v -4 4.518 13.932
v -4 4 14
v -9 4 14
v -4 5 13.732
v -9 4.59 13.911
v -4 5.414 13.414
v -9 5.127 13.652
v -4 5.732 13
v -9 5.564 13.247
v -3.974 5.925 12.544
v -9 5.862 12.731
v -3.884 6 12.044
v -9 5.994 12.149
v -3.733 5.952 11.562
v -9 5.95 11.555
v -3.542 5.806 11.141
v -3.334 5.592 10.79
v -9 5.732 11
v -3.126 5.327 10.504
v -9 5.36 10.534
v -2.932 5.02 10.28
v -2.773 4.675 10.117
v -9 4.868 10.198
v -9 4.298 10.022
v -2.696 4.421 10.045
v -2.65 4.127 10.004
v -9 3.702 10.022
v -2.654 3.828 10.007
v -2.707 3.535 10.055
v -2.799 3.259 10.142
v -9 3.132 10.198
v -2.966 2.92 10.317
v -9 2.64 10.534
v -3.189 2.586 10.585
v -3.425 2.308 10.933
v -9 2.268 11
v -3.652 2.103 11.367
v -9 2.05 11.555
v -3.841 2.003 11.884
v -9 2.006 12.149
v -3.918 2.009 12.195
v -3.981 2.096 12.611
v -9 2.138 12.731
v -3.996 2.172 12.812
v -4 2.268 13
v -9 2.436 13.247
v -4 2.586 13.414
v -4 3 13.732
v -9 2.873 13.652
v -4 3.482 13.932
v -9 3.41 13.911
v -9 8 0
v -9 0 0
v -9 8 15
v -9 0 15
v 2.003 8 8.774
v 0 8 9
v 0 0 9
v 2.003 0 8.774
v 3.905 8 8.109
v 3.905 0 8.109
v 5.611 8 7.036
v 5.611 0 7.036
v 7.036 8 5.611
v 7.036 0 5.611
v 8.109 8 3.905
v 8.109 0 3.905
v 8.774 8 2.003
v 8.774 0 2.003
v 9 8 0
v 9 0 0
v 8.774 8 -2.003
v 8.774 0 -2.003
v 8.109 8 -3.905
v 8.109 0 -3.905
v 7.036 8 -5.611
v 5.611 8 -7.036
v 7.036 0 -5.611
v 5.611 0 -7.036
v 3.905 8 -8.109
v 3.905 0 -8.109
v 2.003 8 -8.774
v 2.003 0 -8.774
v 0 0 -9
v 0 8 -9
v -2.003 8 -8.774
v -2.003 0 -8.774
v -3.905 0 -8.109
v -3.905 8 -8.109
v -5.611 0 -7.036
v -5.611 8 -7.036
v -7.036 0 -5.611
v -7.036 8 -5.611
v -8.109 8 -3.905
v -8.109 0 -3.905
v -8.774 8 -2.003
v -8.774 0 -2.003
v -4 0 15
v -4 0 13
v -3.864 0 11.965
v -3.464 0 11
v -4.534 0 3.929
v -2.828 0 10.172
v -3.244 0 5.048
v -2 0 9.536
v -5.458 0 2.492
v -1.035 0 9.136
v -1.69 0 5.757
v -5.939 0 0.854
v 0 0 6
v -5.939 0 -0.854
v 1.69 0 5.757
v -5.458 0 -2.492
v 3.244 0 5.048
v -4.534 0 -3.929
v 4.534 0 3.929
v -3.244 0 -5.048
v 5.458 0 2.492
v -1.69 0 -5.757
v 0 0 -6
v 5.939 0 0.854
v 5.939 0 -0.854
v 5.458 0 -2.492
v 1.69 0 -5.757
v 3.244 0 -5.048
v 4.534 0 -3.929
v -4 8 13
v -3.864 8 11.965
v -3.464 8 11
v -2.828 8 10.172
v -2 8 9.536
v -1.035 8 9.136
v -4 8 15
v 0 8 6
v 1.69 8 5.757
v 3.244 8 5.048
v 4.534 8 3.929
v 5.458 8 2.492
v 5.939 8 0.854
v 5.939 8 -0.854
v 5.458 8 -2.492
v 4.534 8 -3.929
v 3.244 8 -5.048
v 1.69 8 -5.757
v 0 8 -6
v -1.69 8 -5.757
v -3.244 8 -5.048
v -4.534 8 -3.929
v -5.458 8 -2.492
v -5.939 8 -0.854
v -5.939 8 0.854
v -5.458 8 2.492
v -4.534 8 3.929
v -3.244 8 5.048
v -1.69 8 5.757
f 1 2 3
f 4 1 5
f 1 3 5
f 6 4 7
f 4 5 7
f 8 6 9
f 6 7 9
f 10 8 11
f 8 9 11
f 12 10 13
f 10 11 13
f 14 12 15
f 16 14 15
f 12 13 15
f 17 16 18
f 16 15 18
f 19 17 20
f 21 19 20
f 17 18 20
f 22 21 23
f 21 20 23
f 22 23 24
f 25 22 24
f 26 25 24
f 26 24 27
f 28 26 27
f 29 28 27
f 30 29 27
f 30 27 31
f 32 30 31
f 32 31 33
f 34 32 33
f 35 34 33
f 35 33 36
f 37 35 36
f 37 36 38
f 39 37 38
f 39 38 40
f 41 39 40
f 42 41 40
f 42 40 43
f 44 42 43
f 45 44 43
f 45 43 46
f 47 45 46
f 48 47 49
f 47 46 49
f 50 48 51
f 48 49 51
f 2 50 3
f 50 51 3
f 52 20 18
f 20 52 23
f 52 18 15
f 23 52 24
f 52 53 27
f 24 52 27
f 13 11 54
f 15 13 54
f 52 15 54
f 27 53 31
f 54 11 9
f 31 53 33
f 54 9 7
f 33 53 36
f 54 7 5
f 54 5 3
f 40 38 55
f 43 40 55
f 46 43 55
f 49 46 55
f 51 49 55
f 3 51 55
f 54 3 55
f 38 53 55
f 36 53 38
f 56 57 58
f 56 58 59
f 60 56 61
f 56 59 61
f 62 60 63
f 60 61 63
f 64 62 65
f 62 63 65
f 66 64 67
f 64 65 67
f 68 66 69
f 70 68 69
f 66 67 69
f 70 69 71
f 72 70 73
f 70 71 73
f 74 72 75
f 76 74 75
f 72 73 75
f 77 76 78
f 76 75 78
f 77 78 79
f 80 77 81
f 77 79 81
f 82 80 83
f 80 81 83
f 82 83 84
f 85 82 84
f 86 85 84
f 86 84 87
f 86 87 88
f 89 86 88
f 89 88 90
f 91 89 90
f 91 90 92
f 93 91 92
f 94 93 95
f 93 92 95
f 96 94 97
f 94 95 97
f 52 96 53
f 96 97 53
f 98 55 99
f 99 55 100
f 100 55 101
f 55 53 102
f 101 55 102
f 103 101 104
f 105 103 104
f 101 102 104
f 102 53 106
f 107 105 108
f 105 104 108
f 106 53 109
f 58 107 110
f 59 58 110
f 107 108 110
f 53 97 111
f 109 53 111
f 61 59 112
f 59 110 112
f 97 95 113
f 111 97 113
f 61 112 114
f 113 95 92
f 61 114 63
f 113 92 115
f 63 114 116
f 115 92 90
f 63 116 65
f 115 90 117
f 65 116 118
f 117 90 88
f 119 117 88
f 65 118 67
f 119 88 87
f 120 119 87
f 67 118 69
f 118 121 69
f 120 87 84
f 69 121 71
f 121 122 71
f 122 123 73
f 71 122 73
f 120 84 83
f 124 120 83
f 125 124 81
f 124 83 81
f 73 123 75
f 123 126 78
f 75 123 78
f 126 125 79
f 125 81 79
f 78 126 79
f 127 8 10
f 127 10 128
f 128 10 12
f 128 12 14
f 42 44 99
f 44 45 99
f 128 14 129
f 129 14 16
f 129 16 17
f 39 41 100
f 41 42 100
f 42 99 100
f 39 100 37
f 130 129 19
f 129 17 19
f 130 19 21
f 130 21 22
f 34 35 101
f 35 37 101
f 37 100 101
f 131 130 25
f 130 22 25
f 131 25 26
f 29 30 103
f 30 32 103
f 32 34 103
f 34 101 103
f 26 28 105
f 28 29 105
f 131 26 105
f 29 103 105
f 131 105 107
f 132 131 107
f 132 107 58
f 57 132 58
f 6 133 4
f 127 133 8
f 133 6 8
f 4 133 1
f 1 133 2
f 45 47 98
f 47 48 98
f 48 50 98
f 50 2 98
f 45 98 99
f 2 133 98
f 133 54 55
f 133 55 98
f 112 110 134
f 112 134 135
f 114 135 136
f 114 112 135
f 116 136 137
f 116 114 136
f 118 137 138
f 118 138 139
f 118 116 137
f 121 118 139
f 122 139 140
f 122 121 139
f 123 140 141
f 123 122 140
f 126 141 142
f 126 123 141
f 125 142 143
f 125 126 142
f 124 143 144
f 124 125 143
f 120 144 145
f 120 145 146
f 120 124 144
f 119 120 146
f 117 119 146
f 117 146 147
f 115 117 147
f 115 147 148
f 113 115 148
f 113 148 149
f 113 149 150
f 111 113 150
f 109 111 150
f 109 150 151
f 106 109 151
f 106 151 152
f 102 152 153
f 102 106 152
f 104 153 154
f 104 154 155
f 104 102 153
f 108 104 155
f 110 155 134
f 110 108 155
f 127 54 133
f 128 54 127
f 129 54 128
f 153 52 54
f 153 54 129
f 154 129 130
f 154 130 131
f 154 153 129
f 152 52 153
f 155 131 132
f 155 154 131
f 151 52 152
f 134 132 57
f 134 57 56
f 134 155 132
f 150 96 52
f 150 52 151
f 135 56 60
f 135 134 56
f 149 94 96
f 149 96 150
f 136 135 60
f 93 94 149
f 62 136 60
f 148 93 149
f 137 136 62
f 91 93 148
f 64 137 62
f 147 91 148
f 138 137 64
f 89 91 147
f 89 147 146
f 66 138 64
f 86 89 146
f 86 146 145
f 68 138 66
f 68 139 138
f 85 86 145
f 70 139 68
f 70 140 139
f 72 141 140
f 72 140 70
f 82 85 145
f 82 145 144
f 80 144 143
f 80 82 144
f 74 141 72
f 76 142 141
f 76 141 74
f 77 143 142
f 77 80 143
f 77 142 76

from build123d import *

# Parameters (mm, degrees)
CROQUIS1_R              = 6
SALIENTE_EXTRUIR1_DEPTH = 8
CROQUIS3_R              = 2
CORTAR_EXTRUIR1_DEPTH   = 10


with BuildPart() as part:
    # Croquis1 → Saliente-Extruir1 (new body)
    with BuildSketch(Plane(origin=(0, 0, 0), x_dir=(1, 0, 0), z_dir=(0, 1, 0))):
        with BuildLine():
            Line((-9, 0), (-9, -15))
            Line((-9, -15), (-4, -15))
            Line((-4, -15), (-4, -13))
            ThreePointArc((-4, -13), (-2.828427125, -10.171572875), (0, -9))
            ThreePointArc((0, -9), (6.363961031, 6.363961031), (-9, 0))
        make_face()
        with Locations(Location((0, 0, 0), (0, 0, 270))):
            Circle(CROQUIS1_R, mode=Mode.SUBTRACT)
    extrude(amount=SALIENTE_EXTRUIR1_DEPTH)

    # Croquis3 → Cortar-Extruir1 (cut)
    with BuildSketch(Plane.ZY.offset(9)):
        with Locations((12, 4)):
            Circle(CROQUIS3_R)
    extrude(amount=-CORTAR_EXTRUIR1_DEPTH, mode=Mode.SUBTRACT)


solid = part.part
